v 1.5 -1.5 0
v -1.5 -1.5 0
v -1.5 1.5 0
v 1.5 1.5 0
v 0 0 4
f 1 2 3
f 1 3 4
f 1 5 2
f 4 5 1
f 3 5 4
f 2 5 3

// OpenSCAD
// scale 0: extrusion to a point
linear_extrude(height = 4, scale = 0) square(3, center = true);
